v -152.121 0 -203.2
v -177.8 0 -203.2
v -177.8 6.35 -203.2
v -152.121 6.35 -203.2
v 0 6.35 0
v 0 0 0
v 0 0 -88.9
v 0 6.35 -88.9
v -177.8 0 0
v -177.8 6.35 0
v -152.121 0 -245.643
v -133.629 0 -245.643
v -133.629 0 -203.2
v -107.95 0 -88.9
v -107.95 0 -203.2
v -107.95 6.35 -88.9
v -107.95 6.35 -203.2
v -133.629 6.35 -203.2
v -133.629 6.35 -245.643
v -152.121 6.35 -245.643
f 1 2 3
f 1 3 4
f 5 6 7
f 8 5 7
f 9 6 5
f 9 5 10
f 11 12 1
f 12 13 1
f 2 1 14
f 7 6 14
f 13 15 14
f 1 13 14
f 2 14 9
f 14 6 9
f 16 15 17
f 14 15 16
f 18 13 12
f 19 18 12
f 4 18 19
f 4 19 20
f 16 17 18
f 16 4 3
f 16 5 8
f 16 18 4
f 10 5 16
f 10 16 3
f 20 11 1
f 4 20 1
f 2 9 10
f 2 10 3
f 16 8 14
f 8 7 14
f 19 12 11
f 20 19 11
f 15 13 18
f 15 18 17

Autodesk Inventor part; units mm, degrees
ref_plane "YZ Plane" through (0, 0, 0) normal (1, 0, 0) x (0, 1, 0)
ref_plane "XZ Plane" through (0, 0, 0) normal (0, 1, 0) x (-1, 0, 0)
ref_plane "XY Plane" through (0, 0, 0) normal (0, 0, 1) x (1, 0, 0)
sketch "Sketch1" plane through (0, 0, 0) normal (0, 1, 0) x (-1, 0, 0)
  point P0 (0, 0)
sketch "Sketch2" plane through (0, 0, 0) normal (0, 1, 0) x (-1, 0, 0)
  line L0 (0, 0) -> (177.8, 0)
  line L1 (177.8, 0) -> (177.8, -203.2)
  line L2 (0, 0) -> (0, -88.9)
  line L3 (177.8, -203.2) -> (107.95, -203.2)
  line L4 (107.95, -203.2) -> (107.95, -88.9)
  line L5 (0, -88.9) -> (107.95, -88.9)
  line L6 (152.1206, -203.2) -> (133.6294, -203.2)
  line L7 (133.6294, -203.2) -> (133.6294, -245.6434)
  line L8 (133.6294, -245.6434) -> (152.1206, -245.6434)
  line L9 (152.1206, -245.6434) -> (152.1206, -203.2)
  dimension "d0" = 203.2
  dimension "d1" = 177.8
  dimension "d2" = 88.9
  dimension "d3" = 69.85
  dimension "d7" = 18.4912
  dimension "d8" = 42.4434
  dimension "d9" = 25.6794
extrude "Extrusion1" add sketch "Sketch2" along normal blind 6.35
properties part number "RSX bottom" material "Aluminum 6061"
